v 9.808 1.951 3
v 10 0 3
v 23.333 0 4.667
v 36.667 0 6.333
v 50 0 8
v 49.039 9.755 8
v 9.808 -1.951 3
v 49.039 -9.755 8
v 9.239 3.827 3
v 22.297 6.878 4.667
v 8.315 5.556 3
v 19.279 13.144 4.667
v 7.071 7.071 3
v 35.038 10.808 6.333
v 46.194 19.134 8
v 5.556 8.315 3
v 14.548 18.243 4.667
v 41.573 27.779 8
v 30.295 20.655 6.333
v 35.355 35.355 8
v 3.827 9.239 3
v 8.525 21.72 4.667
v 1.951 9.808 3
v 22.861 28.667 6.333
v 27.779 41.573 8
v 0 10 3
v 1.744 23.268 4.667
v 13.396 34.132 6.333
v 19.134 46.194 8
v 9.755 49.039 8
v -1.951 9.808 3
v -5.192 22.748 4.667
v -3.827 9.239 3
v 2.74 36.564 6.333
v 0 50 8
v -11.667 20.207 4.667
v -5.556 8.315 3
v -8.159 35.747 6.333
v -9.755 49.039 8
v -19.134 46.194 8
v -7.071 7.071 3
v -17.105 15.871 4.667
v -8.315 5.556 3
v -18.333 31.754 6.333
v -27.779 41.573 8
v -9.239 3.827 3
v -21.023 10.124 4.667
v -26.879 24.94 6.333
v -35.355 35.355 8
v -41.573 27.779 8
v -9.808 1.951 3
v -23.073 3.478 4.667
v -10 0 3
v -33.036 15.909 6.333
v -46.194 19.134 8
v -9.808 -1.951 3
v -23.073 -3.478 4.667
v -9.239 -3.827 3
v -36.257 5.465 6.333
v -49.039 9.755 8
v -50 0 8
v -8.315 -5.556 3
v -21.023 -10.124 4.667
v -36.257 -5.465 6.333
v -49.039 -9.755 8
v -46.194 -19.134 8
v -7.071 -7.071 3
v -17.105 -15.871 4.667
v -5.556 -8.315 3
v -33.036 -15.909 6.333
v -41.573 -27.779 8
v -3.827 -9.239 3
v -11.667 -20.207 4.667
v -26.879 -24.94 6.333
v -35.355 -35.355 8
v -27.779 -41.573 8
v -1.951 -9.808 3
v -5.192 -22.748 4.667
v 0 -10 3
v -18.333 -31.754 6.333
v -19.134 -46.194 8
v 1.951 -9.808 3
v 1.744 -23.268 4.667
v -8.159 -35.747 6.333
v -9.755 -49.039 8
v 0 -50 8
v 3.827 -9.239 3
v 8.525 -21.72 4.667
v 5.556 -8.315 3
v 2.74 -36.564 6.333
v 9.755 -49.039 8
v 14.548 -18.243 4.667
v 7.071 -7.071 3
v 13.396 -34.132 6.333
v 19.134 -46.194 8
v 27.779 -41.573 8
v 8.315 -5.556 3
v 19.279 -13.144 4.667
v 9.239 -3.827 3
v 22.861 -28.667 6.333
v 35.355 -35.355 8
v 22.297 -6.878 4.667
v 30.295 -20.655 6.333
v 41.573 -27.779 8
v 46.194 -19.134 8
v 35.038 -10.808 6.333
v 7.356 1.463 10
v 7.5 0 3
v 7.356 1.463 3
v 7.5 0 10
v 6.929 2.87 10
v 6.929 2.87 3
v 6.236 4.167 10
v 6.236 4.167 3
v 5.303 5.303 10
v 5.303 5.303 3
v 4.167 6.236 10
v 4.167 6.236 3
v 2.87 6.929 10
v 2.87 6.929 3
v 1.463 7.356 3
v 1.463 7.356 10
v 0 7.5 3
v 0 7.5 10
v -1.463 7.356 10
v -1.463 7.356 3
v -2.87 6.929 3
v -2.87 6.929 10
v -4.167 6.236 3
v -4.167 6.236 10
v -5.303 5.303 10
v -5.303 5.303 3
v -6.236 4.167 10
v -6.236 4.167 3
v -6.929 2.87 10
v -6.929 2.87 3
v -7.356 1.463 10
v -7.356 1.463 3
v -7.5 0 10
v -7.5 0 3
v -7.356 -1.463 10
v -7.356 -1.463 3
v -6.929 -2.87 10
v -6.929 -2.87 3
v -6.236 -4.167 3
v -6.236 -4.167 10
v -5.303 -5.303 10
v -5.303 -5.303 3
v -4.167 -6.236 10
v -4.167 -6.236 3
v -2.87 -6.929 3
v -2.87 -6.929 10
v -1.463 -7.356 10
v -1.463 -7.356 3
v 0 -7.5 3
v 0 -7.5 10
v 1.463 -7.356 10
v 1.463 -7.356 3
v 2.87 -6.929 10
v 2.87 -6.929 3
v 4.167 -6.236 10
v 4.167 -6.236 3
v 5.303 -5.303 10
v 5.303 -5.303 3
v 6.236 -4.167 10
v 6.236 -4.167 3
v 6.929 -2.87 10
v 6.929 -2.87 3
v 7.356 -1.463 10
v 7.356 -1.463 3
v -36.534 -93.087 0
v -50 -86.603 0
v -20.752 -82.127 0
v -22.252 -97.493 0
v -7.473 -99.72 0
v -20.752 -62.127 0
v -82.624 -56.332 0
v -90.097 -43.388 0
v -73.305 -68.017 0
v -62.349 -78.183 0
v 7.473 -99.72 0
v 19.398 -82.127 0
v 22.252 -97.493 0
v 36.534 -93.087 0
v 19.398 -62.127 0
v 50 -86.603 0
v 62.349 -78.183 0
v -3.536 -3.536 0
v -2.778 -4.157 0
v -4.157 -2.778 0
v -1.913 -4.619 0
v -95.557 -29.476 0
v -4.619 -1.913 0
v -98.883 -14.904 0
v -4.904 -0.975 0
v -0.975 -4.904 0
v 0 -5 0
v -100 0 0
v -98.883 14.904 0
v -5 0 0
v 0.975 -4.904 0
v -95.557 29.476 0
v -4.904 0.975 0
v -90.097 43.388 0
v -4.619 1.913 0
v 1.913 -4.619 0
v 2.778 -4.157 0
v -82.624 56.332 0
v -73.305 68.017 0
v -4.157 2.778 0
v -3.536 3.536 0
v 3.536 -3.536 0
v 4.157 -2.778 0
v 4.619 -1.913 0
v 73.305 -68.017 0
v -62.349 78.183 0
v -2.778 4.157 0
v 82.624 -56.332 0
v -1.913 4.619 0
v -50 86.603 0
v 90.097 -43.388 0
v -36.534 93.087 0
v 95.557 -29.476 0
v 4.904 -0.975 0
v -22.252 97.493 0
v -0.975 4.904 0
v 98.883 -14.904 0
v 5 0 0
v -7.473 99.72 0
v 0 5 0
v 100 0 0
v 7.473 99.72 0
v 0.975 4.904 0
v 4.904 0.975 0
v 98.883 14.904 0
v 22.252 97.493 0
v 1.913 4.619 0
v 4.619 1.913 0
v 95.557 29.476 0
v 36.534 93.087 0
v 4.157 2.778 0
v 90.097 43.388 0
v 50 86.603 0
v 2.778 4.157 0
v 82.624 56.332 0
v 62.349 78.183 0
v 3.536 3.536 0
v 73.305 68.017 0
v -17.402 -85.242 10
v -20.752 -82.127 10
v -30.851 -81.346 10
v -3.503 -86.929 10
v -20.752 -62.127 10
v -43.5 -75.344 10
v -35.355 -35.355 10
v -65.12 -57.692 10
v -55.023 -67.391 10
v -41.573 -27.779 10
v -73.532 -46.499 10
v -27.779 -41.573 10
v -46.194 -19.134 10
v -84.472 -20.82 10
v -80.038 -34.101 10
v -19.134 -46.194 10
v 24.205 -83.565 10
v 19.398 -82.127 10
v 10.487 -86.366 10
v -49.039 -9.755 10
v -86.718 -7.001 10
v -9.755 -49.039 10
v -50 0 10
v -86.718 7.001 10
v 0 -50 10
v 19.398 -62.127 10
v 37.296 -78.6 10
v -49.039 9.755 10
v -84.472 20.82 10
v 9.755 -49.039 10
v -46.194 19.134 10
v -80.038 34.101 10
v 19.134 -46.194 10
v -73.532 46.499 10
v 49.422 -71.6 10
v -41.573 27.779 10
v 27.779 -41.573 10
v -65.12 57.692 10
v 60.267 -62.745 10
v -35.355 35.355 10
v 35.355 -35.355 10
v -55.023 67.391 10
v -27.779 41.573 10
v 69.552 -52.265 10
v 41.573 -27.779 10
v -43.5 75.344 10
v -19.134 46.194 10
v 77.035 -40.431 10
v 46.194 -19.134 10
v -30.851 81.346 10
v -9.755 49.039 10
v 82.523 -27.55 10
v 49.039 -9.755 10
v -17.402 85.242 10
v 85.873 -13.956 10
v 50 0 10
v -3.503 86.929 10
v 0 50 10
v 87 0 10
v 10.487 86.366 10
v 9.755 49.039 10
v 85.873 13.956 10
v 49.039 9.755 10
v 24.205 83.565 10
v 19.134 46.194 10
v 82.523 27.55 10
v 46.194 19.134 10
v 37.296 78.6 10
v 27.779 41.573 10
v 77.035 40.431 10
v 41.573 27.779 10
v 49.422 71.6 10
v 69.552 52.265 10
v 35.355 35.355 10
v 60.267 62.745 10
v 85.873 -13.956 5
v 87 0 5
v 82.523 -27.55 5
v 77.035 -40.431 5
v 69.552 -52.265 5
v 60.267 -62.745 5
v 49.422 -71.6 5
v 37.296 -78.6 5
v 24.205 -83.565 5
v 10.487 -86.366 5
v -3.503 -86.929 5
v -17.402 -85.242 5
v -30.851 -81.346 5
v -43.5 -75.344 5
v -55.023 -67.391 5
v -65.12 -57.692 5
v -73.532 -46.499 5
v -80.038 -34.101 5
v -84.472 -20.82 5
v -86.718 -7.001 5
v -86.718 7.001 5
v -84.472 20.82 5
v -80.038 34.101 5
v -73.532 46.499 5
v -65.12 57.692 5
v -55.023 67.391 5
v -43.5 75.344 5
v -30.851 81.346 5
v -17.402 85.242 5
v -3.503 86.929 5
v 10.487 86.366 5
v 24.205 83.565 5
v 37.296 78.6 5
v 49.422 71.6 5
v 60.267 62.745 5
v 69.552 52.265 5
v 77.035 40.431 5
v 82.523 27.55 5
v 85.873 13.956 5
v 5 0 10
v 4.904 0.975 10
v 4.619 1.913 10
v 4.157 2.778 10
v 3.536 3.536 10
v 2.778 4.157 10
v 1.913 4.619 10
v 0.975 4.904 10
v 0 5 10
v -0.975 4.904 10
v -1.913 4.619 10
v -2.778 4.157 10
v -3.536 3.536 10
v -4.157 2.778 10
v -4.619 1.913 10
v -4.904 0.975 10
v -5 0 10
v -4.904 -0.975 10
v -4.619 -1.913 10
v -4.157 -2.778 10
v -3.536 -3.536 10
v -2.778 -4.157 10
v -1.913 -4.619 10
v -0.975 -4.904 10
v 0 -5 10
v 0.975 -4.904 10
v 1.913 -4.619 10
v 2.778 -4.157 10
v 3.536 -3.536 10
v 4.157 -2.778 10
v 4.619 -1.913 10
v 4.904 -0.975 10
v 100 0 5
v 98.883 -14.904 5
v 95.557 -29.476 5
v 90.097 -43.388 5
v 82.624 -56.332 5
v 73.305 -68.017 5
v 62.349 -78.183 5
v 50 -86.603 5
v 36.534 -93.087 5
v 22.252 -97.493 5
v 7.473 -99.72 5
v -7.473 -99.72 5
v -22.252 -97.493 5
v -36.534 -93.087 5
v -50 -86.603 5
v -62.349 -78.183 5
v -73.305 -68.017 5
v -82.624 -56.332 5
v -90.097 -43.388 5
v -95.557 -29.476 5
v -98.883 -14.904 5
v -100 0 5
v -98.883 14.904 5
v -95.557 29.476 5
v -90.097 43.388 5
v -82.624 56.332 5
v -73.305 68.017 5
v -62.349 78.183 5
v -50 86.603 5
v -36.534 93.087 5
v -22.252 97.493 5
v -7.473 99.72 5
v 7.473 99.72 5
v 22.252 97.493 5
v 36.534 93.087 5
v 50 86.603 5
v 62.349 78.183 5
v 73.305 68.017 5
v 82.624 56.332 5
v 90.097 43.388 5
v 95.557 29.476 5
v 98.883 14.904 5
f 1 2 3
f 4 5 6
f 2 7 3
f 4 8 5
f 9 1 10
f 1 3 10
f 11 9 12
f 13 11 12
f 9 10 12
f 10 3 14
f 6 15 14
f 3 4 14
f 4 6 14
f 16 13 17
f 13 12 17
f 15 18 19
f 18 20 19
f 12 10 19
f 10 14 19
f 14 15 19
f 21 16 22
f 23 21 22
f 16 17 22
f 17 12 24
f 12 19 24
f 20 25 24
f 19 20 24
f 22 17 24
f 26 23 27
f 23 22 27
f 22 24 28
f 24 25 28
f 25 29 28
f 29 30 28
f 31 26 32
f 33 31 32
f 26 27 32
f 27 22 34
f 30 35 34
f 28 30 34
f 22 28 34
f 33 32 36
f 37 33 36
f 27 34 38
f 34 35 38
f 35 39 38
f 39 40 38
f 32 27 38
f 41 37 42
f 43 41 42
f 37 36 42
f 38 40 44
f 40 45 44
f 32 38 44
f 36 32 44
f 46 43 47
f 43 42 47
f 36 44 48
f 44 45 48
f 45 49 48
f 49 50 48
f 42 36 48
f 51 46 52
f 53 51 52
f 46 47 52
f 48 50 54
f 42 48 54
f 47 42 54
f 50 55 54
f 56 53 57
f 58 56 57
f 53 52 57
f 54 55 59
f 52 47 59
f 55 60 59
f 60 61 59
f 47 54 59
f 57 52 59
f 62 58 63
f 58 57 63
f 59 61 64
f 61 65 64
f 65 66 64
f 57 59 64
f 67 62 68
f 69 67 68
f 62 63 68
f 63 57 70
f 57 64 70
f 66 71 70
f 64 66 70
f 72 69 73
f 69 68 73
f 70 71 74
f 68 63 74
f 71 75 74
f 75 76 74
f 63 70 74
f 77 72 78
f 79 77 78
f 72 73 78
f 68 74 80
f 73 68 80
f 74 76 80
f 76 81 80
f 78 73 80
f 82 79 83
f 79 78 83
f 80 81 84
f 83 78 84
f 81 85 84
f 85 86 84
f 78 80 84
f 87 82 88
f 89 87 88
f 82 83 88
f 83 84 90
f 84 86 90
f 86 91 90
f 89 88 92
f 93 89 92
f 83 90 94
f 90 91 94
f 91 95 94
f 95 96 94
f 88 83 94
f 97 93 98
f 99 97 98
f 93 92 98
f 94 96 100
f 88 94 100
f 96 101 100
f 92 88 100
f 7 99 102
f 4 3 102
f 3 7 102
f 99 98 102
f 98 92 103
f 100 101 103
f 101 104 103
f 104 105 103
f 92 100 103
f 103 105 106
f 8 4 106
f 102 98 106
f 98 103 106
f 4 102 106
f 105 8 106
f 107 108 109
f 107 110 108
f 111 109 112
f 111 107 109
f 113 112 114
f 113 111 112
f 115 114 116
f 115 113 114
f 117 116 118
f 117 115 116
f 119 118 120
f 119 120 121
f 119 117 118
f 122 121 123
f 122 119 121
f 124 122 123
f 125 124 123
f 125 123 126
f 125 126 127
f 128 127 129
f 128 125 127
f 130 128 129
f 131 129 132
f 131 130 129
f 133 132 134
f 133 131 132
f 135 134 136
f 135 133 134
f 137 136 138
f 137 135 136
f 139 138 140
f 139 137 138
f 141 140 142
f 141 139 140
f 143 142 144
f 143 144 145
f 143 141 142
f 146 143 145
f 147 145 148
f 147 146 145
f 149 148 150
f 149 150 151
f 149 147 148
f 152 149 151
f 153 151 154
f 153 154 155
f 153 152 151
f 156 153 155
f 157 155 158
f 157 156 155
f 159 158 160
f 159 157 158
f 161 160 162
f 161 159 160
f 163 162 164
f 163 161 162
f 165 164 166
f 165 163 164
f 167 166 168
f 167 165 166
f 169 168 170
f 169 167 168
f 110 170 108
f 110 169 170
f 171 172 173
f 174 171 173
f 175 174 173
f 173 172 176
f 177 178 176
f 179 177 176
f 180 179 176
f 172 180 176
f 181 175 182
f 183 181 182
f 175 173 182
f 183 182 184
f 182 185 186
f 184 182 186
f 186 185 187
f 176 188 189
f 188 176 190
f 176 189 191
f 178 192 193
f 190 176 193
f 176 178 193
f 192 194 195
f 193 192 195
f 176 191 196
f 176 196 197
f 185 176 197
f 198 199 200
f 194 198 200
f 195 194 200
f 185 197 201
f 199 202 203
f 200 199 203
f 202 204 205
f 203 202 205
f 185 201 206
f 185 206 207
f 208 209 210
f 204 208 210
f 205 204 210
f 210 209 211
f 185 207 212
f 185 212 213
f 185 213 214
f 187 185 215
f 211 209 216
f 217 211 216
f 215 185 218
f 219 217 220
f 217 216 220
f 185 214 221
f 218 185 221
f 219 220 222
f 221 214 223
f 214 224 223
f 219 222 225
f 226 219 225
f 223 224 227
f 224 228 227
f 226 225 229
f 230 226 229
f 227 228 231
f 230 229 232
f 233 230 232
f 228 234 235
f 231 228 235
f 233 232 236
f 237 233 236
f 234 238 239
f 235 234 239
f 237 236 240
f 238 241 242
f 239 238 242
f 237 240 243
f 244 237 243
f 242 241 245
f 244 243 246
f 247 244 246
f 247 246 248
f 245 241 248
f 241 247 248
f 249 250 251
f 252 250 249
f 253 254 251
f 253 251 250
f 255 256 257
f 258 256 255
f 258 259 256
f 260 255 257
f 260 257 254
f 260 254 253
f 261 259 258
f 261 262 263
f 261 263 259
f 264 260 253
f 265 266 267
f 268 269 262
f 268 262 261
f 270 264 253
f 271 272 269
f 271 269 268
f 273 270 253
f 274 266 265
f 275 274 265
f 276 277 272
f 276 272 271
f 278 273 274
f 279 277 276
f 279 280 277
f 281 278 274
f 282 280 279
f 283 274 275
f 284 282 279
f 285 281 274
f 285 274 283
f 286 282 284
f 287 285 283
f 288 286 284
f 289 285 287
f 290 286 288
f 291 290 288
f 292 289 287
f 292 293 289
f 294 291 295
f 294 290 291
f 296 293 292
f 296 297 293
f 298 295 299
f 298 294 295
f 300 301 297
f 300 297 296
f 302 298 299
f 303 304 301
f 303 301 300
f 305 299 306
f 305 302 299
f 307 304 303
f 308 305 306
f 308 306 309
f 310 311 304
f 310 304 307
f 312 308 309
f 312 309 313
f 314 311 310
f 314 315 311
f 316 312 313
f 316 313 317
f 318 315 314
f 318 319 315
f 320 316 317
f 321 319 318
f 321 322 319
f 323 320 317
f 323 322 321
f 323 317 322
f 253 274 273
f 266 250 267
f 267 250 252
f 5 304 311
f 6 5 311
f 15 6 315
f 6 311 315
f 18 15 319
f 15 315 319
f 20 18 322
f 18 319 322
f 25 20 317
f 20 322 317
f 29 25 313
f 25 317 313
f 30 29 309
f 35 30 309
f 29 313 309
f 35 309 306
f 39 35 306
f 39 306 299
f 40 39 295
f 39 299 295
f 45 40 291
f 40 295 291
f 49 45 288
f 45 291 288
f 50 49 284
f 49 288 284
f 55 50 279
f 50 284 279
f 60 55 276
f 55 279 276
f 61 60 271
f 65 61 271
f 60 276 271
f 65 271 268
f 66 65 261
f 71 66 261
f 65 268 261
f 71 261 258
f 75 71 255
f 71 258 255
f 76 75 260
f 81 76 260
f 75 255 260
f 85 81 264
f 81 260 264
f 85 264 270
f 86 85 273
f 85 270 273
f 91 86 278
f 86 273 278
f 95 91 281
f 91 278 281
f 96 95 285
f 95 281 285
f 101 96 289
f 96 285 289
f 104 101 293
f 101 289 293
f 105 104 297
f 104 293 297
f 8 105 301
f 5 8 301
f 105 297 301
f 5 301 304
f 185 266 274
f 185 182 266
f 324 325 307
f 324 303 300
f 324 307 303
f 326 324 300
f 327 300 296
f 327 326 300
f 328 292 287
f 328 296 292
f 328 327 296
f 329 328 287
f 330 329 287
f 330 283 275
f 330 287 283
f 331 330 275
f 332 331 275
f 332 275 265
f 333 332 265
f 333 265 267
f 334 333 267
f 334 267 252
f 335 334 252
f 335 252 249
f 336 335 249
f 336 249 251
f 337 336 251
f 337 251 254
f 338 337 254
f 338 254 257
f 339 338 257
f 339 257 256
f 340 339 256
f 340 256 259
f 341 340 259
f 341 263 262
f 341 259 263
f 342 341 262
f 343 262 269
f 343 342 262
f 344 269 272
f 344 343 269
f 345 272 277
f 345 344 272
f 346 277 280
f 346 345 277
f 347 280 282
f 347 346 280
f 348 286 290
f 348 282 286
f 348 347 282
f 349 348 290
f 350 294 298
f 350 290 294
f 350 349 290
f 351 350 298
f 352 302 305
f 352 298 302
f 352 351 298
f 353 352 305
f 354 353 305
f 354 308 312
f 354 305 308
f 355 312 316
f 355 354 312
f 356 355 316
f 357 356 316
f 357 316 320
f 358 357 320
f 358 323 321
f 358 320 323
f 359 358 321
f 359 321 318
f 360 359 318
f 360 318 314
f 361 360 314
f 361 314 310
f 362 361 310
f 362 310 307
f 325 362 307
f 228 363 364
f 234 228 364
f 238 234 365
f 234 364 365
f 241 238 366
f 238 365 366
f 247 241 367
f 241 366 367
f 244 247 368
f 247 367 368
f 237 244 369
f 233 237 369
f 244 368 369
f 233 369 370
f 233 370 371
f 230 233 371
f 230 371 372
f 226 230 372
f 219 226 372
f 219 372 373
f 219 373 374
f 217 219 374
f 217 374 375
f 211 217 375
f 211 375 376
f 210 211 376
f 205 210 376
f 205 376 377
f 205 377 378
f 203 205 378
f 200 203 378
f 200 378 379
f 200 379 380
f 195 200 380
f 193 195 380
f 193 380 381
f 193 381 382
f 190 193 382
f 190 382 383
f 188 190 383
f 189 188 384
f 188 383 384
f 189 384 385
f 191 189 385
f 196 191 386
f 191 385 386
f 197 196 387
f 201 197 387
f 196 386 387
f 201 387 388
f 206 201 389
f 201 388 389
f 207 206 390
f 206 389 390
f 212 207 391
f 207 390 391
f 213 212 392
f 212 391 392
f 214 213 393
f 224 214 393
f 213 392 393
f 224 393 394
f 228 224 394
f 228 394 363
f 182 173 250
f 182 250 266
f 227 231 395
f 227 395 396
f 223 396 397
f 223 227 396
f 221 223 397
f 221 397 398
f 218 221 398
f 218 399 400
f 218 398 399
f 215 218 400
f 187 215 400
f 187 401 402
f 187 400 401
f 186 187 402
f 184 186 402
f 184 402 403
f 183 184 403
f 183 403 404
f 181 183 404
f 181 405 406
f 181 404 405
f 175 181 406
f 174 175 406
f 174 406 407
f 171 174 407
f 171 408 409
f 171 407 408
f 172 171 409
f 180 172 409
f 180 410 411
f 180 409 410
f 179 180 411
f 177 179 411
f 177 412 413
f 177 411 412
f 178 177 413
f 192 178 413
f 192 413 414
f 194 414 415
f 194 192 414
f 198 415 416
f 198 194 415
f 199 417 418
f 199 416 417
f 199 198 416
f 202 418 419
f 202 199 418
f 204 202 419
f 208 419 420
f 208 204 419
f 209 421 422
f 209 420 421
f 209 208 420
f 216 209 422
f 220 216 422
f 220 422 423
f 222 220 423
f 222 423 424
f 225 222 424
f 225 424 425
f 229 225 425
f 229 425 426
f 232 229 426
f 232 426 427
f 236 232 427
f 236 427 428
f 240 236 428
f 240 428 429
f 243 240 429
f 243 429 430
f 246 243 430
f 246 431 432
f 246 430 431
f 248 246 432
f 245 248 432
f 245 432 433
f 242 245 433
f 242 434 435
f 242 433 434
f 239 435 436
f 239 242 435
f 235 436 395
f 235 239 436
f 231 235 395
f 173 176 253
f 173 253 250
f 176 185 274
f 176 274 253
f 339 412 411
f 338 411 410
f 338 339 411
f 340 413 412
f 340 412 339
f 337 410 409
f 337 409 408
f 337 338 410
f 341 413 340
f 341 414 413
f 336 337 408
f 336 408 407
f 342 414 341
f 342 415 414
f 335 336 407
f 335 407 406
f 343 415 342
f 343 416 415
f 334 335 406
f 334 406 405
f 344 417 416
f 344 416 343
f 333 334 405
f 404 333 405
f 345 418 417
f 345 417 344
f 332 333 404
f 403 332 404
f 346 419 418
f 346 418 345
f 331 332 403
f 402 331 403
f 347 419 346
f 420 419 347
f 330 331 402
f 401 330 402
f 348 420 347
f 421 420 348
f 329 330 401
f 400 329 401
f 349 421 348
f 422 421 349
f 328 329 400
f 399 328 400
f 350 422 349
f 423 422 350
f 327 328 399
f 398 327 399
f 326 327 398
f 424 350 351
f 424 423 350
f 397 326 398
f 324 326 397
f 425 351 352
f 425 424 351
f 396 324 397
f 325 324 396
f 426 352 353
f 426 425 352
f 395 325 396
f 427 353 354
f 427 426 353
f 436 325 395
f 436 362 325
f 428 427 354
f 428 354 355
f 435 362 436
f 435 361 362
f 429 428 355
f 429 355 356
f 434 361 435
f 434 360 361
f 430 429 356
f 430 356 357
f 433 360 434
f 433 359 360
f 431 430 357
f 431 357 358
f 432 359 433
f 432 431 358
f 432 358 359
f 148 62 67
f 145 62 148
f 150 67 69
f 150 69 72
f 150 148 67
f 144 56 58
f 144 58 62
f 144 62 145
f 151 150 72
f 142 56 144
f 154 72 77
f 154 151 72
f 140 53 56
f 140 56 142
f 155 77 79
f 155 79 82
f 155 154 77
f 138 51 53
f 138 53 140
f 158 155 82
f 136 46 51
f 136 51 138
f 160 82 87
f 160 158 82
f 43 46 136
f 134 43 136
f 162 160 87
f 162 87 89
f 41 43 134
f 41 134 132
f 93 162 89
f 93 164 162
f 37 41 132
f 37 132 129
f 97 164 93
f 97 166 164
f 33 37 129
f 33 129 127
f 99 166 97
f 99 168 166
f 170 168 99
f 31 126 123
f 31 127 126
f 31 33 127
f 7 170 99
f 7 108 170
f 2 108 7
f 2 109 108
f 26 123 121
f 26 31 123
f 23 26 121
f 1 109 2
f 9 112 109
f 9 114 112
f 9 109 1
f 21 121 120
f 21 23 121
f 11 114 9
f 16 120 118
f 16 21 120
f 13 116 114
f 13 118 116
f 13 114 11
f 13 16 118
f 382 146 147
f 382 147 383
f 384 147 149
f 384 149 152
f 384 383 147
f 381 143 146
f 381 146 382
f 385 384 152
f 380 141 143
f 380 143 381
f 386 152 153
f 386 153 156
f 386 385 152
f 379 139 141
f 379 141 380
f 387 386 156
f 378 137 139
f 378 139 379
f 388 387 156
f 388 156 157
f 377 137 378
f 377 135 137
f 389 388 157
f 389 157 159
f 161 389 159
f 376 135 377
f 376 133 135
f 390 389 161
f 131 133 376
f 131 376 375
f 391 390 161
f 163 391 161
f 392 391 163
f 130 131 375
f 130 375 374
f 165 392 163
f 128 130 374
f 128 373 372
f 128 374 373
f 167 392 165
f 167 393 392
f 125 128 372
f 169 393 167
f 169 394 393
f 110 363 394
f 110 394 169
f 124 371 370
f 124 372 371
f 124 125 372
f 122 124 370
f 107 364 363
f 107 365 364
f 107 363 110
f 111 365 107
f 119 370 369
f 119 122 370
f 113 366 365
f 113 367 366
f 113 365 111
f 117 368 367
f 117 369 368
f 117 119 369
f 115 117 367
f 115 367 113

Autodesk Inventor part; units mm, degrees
ref_plane "YZ Plane" through (0, 0, 0) normal (1, 0, 0) x (0, 1, 0)
ref_plane "XZ Plane" through (0, 0, 0) normal (0, 1, 0) x (-1, 0, 0)
ref_plane "XY Plane" through (0, 0, 0) normal (0, 0, 1) x (1, 0, 0)
sketch "Sketch1" plane through (0, 0, 0) normal (0, 0, 1) x (1, 0, 0)
  circle A0 centre (0, 0) radius 100
  dimension "d0" = 200
extrude "Extrusion1" add sketch "Sketch1" along normal blind 5
sketch "Sketch2" plane through (0, 0, 5) normal (0, 0, 1) x (1, 0, 0)
  circle A0 centre (0, 0) radius 87
  dimension "d3" = 174
extrude "Extrusion2" add sketch "Sketch2" along normal blind 5
sketch "Sketch3" plane through (0, 0, 10) normal (0, 0, 1) x (1, 0, 0)
  circle A0 centre (0, 0) radius 5
  dimension "d6" = 10
extrude "Extrusion3" cut sketch "Sketch3" against normal blind 10
sketch "Sketch4" plane through (0, 0, 10) normal (0, 0, 1) x (1, 0, 0)
  circle A0 centre (0, 0) radius 7.5
  circle A1 centre (0, 0) radius 5 projected
  circle A2 centre (0, 0) radius 50
  dimension "d9" = 15
  dimension "d10" = 100
extrude "Extrusion4" cut sketch "Sketch4" against normal blind 7 contours A2
chamfer "Chamfer1" distance 5 distance2 40 1 edges at (-50, 0, 3) measured on face at (-30.4381, 39.6677, 7.6667)
sketch "Sketch10" plane through (0, 0, 0) normal (0, 0, -1) x (-1, 0, 0)
  circle A0 centre (0, 0) radius 100 projected
  line L0 (0, -100) -> (0, -82.127)
  line L1 (0, -82.127) -> (20.7525, -82.127)
  line L2 (20.7525, -82.127) -> (-19.3985, -82.127)
  line L3 (-19.3985, -82.127) -> (-19.3985, -62.127)
  line L4 (-19.3985, -62.127) -> (20.7525, -62.127)
  line L5 (20.7525, -62.127) -> (20.7525, -82.127)
  dimension "d52" = 17.873
  dimension "d53" = 20.7525
  dimension "d54" = 40.151
  dimension "d55" = 20
extrude "Extrusion10" cut sketch "Sketch10" against normal blind 10 contours L2 L3 L4 L5 L1
properties part number "Rotating Plate"
